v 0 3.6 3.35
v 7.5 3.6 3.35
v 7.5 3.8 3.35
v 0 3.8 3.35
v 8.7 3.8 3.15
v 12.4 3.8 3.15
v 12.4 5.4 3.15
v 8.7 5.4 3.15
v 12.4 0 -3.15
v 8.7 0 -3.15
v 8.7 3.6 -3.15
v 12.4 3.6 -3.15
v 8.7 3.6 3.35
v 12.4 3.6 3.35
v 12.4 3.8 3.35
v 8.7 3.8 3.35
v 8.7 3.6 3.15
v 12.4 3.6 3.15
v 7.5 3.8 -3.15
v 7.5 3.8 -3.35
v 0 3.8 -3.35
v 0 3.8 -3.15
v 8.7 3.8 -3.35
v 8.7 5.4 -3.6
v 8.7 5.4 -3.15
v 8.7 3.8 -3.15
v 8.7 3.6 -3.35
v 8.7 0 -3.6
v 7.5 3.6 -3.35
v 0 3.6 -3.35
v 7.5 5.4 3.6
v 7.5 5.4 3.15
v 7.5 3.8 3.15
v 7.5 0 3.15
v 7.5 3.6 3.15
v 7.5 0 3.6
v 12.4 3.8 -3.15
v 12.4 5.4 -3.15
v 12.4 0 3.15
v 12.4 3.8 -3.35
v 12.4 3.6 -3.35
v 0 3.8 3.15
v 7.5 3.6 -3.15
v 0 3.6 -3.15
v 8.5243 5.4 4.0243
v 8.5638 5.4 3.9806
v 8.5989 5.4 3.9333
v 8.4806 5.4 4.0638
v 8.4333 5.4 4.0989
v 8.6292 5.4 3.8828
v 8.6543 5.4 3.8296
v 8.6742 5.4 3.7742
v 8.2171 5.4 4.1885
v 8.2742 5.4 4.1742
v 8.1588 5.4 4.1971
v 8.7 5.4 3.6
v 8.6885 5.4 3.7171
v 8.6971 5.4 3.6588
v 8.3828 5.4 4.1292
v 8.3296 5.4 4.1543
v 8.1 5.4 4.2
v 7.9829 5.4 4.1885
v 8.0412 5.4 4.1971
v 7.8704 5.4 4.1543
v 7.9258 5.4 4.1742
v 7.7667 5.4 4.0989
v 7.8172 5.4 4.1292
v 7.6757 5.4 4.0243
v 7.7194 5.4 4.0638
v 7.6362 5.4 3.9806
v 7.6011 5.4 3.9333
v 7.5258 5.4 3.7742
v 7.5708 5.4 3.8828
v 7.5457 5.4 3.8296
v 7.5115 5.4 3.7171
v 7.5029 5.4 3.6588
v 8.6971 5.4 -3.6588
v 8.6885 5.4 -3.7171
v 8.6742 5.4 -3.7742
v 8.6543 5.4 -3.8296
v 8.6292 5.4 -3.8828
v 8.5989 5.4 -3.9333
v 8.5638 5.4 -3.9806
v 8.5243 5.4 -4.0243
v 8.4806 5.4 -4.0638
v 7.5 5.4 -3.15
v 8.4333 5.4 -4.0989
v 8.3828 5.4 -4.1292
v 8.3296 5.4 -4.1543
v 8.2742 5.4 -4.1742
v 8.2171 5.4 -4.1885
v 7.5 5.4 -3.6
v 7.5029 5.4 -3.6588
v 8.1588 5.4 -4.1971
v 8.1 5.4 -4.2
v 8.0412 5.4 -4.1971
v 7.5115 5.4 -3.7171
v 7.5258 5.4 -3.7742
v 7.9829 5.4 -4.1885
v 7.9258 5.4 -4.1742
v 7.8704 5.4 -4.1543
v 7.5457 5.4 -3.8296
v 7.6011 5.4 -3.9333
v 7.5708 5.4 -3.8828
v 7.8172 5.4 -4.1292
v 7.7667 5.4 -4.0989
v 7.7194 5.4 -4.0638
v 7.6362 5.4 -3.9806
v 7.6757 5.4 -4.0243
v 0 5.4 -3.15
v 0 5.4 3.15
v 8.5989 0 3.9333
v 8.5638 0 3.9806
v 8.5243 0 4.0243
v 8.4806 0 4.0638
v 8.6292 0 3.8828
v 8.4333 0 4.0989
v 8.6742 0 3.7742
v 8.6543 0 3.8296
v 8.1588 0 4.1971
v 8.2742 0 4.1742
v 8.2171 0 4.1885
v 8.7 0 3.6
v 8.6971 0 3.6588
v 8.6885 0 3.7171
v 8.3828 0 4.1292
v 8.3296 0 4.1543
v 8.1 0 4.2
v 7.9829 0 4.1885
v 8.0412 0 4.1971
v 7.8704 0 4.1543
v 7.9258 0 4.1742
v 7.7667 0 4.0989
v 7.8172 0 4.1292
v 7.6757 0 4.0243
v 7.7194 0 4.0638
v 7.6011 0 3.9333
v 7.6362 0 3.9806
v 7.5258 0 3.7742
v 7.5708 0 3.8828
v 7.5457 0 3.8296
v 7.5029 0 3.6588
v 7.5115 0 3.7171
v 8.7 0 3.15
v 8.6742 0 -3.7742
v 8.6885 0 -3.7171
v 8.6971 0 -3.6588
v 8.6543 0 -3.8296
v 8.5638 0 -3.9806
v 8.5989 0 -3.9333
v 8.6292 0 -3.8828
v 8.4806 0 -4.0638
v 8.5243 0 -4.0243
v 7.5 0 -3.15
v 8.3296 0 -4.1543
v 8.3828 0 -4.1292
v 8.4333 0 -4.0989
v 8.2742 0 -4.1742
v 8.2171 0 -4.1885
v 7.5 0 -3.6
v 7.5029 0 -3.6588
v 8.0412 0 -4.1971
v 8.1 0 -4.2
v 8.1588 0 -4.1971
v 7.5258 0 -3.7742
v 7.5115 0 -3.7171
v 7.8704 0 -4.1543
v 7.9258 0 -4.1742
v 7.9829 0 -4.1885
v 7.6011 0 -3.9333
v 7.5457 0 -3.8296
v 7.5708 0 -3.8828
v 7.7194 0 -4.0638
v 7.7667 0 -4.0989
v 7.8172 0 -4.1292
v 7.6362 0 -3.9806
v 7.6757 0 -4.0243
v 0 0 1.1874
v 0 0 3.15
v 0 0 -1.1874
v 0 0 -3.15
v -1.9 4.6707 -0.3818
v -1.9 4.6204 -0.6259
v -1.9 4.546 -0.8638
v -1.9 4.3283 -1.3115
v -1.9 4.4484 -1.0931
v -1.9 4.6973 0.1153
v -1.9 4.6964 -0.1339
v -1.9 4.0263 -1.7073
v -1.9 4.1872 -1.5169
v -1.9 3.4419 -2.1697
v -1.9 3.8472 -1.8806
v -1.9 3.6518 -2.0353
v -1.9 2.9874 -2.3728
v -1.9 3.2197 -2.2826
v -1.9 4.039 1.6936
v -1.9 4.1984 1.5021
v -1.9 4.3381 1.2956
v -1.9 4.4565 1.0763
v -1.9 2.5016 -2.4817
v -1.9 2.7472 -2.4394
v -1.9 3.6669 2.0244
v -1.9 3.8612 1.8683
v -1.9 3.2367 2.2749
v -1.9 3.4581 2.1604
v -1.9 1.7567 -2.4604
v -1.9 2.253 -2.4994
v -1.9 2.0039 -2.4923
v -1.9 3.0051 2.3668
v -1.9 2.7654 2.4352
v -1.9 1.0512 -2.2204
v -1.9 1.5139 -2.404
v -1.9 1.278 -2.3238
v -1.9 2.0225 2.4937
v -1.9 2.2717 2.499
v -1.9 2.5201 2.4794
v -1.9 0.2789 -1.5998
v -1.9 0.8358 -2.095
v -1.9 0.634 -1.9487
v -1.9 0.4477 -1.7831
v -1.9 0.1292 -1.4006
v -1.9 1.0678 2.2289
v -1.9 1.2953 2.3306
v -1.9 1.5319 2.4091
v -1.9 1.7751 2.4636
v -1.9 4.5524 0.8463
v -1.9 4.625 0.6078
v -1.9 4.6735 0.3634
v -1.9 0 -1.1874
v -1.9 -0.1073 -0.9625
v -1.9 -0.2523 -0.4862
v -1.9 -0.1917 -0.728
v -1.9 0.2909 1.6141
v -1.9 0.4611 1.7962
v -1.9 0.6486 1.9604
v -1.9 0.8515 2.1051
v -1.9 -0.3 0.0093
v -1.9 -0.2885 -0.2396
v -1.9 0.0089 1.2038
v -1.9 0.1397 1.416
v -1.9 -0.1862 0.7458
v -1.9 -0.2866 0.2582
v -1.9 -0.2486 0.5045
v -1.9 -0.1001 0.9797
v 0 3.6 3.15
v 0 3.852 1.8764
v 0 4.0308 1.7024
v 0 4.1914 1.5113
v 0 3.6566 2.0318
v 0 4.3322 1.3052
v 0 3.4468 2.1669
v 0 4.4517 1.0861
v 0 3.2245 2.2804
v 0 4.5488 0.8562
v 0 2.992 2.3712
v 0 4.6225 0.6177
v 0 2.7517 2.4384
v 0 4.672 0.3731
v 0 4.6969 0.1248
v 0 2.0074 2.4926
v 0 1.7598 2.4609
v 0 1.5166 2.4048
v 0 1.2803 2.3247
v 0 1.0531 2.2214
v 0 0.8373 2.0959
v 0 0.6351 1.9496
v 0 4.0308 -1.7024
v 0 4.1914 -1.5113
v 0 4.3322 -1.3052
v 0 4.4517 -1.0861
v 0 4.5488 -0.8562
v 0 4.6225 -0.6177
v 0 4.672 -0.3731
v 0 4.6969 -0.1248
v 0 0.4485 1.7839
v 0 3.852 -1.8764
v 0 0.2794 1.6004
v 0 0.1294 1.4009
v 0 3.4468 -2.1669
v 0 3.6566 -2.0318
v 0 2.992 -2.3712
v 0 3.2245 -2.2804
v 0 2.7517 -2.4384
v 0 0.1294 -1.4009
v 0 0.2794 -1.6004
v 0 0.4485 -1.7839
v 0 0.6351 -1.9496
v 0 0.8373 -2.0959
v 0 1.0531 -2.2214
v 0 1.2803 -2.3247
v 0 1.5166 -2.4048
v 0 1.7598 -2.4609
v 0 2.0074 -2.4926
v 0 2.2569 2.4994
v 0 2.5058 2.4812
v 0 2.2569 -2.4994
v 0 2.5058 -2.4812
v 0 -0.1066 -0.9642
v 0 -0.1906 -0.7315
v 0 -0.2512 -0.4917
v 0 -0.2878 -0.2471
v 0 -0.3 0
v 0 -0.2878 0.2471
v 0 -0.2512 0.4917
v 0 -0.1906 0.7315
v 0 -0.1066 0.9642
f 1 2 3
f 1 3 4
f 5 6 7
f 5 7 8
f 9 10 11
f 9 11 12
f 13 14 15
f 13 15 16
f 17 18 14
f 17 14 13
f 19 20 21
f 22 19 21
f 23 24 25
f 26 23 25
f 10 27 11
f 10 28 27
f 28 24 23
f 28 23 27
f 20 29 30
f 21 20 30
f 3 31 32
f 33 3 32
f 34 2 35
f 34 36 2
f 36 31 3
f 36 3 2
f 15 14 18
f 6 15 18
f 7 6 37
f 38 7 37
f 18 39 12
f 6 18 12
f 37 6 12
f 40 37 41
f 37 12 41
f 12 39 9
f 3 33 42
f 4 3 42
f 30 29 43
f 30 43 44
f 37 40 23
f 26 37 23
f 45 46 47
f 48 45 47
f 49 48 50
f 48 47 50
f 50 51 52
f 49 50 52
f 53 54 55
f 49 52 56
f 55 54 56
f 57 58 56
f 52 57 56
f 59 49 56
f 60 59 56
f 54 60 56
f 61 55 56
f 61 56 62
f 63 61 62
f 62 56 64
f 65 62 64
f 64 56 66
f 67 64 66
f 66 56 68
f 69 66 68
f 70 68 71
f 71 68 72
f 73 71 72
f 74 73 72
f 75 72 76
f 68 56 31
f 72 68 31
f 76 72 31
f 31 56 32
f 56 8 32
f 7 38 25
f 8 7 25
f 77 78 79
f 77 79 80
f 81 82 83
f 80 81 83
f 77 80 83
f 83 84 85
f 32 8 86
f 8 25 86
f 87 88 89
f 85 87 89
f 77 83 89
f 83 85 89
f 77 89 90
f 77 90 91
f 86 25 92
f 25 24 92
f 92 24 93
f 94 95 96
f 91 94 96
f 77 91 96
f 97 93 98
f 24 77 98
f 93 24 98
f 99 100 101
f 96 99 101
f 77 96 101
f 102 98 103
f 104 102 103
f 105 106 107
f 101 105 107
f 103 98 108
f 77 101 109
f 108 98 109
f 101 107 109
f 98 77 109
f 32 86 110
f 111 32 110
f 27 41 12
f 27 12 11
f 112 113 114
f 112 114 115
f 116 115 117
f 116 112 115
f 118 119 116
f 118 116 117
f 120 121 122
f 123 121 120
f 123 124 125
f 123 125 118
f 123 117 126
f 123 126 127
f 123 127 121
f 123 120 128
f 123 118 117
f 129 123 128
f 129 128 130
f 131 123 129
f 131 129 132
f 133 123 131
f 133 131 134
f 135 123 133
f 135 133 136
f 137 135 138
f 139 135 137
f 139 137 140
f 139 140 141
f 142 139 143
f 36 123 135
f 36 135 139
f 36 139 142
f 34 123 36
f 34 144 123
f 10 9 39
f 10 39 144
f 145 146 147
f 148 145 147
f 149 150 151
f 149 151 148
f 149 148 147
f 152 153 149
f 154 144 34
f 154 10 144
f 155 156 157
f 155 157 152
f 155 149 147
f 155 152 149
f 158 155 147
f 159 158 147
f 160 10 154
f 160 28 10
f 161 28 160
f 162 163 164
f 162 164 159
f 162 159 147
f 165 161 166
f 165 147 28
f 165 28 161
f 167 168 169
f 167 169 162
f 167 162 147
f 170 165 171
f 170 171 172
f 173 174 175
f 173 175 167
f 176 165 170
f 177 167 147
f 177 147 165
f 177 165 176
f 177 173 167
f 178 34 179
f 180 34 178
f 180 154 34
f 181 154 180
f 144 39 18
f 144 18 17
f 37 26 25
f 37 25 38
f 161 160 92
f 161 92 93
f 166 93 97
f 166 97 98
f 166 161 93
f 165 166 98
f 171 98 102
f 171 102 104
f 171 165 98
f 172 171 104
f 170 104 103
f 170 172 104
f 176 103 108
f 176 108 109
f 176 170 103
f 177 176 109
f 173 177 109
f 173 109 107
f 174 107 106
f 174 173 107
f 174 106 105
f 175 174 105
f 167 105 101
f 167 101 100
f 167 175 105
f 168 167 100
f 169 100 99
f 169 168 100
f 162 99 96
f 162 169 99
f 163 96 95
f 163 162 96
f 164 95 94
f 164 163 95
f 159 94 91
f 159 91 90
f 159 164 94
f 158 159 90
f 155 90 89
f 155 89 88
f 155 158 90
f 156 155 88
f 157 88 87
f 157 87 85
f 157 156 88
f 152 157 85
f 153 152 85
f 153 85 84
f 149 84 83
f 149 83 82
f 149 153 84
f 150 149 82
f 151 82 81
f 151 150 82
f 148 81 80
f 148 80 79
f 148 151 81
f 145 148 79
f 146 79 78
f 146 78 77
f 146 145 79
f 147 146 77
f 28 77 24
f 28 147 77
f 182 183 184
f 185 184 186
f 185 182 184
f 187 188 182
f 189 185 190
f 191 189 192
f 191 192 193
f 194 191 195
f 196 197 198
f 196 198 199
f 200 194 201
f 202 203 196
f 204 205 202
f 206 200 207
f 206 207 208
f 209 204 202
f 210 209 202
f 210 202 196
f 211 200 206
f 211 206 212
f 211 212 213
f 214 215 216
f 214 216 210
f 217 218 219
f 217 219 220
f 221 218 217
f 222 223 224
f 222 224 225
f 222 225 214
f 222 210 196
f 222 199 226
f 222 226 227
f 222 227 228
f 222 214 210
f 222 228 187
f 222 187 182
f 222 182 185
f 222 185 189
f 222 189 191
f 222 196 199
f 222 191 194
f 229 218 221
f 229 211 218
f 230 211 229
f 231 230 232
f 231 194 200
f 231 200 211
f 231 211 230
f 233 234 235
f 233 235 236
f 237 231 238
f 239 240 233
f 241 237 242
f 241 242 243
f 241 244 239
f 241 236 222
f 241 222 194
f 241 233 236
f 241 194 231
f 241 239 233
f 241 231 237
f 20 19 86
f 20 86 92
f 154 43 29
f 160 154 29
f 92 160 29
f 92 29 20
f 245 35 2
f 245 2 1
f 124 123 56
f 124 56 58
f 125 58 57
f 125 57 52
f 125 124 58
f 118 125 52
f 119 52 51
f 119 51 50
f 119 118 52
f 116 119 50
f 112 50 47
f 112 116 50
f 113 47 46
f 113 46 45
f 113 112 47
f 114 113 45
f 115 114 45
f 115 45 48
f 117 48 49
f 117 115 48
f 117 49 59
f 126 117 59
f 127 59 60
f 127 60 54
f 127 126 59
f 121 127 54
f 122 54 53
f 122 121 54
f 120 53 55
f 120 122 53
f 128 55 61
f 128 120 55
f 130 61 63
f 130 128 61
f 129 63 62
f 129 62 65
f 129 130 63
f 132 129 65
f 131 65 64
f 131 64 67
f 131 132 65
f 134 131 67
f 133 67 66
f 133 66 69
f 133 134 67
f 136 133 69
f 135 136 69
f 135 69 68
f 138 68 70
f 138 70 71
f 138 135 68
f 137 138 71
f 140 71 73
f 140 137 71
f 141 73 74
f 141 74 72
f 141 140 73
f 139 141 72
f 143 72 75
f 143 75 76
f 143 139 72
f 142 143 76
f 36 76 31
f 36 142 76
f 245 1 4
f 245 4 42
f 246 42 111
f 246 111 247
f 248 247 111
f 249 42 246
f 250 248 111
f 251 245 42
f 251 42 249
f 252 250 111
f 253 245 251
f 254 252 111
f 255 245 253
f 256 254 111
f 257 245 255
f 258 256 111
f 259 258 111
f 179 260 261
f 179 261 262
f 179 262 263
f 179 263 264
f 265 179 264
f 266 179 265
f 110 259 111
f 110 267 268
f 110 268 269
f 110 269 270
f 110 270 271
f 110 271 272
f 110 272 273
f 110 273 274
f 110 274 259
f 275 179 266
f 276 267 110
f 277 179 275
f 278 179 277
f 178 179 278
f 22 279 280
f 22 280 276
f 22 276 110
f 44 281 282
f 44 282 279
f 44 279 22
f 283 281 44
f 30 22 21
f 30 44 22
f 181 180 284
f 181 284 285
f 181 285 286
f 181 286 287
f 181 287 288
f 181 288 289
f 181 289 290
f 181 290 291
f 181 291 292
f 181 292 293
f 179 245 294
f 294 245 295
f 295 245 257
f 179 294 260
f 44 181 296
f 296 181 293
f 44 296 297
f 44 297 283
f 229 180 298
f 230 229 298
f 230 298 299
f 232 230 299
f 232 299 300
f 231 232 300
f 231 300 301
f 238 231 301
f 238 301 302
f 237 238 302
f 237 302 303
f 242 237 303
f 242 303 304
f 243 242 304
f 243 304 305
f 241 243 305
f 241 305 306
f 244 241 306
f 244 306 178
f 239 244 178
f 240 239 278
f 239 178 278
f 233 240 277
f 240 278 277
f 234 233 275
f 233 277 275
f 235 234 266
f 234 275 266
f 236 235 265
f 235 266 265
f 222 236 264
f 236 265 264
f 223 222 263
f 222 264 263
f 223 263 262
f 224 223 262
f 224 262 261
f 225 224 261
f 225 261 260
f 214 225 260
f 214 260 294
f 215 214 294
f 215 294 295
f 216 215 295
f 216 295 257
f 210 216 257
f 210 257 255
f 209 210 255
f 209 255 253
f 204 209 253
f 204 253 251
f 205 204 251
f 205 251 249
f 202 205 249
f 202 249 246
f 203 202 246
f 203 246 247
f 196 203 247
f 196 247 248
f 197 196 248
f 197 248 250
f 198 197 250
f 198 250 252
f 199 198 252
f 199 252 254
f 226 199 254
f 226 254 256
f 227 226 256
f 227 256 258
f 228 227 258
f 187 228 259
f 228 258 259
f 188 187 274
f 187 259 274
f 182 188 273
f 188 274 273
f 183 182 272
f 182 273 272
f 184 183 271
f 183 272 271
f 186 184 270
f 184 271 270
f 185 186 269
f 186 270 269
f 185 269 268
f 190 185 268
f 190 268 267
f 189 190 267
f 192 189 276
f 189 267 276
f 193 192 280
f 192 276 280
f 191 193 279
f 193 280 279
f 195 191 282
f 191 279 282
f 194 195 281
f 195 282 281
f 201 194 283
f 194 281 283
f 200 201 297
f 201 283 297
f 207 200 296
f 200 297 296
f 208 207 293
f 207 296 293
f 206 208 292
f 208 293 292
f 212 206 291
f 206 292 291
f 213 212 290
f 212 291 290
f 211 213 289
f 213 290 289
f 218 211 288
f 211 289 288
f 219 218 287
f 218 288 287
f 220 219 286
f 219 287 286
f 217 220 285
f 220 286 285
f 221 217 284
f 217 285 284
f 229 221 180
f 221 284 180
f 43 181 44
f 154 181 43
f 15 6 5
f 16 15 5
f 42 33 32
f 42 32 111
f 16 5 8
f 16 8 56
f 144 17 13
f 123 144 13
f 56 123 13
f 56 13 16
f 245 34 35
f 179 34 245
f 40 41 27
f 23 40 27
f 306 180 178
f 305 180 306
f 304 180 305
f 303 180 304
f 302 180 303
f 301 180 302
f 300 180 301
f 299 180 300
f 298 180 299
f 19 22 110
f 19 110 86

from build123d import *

# Parameters (mm, degrees)
BOSS_EXTRUDE1_DEPTH = 5.4
SKETCH2_R           = 2.5
BOSS_EXTRUDE2_DEPTH = 1.9
SKETCH3_W           = 12.4
SKETCH3_H           = 6.7
BOSS_EXTRUDE3_DEPTH = 0.2


with BuildPart() as part:
    # Sketch1 → Boss-Extrude1 (new body)
    with BuildSketch(Plane(origin=(0, 0, 0), x_dir=(1, 0, 0), z_dir=(0, 1, 0))):
        with BuildLine():
            Line((0, -3.15), (0, 3.15))
            Line((0, 3.15), (7.5, 3.15))
            Line((7.5, 3.15), (7.5, 3.6))
            ThreePointArc((7.5, 3.6), (8.1, 4.2), (8.7, 3.6))
            Line((8.7, 3.6), (8.7, 3.15))
            Line((8.7, 3.15), (12.4, 3.15))
            Line((12.4, 3.15), (12.4, -3.15))
            Line((12.4, -3.15), (8.7, -3.15))
            Line((8.7, -3.15), (8.7, -3.6))
            ThreePointArc((8.7, -3.6), (8.1, -4.2), (7.5, -3.6))
            Line((7.5, -3.6), (7.5, -3.15))
            Line((7.5, -3.15), (0, -3.15))
        make_face()
    extrude(amount=BOSS_EXTRUDE1_DEPTH)

    # Sketch2 → Boss-Extrude2 (add)
    with BuildSketch(Plane.ZY):
        with Locations(Location((0, 2.2, 0), (0, 0, 241.642363424))):  # turned: the seam where the file's is
            Circle(SKETCH2_R)
    extrude(amount=BOSS_EXTRUDE2_DEPTH)

    # Sketch3 → Boss-Extrude3 (add)
    with BuildSketch(Plane(origin=(0, 3.6, 0), x_dir=(-1, 0, 0), z_dir=(0, -1, 0))):
        with Locations((-6.2, 0)):
            Rectangle(SKETCH3_W, SKETCH3_H)
    extrude(amount=-BOSS_EXTRUDE3_DEPTH)


solid = part.part
